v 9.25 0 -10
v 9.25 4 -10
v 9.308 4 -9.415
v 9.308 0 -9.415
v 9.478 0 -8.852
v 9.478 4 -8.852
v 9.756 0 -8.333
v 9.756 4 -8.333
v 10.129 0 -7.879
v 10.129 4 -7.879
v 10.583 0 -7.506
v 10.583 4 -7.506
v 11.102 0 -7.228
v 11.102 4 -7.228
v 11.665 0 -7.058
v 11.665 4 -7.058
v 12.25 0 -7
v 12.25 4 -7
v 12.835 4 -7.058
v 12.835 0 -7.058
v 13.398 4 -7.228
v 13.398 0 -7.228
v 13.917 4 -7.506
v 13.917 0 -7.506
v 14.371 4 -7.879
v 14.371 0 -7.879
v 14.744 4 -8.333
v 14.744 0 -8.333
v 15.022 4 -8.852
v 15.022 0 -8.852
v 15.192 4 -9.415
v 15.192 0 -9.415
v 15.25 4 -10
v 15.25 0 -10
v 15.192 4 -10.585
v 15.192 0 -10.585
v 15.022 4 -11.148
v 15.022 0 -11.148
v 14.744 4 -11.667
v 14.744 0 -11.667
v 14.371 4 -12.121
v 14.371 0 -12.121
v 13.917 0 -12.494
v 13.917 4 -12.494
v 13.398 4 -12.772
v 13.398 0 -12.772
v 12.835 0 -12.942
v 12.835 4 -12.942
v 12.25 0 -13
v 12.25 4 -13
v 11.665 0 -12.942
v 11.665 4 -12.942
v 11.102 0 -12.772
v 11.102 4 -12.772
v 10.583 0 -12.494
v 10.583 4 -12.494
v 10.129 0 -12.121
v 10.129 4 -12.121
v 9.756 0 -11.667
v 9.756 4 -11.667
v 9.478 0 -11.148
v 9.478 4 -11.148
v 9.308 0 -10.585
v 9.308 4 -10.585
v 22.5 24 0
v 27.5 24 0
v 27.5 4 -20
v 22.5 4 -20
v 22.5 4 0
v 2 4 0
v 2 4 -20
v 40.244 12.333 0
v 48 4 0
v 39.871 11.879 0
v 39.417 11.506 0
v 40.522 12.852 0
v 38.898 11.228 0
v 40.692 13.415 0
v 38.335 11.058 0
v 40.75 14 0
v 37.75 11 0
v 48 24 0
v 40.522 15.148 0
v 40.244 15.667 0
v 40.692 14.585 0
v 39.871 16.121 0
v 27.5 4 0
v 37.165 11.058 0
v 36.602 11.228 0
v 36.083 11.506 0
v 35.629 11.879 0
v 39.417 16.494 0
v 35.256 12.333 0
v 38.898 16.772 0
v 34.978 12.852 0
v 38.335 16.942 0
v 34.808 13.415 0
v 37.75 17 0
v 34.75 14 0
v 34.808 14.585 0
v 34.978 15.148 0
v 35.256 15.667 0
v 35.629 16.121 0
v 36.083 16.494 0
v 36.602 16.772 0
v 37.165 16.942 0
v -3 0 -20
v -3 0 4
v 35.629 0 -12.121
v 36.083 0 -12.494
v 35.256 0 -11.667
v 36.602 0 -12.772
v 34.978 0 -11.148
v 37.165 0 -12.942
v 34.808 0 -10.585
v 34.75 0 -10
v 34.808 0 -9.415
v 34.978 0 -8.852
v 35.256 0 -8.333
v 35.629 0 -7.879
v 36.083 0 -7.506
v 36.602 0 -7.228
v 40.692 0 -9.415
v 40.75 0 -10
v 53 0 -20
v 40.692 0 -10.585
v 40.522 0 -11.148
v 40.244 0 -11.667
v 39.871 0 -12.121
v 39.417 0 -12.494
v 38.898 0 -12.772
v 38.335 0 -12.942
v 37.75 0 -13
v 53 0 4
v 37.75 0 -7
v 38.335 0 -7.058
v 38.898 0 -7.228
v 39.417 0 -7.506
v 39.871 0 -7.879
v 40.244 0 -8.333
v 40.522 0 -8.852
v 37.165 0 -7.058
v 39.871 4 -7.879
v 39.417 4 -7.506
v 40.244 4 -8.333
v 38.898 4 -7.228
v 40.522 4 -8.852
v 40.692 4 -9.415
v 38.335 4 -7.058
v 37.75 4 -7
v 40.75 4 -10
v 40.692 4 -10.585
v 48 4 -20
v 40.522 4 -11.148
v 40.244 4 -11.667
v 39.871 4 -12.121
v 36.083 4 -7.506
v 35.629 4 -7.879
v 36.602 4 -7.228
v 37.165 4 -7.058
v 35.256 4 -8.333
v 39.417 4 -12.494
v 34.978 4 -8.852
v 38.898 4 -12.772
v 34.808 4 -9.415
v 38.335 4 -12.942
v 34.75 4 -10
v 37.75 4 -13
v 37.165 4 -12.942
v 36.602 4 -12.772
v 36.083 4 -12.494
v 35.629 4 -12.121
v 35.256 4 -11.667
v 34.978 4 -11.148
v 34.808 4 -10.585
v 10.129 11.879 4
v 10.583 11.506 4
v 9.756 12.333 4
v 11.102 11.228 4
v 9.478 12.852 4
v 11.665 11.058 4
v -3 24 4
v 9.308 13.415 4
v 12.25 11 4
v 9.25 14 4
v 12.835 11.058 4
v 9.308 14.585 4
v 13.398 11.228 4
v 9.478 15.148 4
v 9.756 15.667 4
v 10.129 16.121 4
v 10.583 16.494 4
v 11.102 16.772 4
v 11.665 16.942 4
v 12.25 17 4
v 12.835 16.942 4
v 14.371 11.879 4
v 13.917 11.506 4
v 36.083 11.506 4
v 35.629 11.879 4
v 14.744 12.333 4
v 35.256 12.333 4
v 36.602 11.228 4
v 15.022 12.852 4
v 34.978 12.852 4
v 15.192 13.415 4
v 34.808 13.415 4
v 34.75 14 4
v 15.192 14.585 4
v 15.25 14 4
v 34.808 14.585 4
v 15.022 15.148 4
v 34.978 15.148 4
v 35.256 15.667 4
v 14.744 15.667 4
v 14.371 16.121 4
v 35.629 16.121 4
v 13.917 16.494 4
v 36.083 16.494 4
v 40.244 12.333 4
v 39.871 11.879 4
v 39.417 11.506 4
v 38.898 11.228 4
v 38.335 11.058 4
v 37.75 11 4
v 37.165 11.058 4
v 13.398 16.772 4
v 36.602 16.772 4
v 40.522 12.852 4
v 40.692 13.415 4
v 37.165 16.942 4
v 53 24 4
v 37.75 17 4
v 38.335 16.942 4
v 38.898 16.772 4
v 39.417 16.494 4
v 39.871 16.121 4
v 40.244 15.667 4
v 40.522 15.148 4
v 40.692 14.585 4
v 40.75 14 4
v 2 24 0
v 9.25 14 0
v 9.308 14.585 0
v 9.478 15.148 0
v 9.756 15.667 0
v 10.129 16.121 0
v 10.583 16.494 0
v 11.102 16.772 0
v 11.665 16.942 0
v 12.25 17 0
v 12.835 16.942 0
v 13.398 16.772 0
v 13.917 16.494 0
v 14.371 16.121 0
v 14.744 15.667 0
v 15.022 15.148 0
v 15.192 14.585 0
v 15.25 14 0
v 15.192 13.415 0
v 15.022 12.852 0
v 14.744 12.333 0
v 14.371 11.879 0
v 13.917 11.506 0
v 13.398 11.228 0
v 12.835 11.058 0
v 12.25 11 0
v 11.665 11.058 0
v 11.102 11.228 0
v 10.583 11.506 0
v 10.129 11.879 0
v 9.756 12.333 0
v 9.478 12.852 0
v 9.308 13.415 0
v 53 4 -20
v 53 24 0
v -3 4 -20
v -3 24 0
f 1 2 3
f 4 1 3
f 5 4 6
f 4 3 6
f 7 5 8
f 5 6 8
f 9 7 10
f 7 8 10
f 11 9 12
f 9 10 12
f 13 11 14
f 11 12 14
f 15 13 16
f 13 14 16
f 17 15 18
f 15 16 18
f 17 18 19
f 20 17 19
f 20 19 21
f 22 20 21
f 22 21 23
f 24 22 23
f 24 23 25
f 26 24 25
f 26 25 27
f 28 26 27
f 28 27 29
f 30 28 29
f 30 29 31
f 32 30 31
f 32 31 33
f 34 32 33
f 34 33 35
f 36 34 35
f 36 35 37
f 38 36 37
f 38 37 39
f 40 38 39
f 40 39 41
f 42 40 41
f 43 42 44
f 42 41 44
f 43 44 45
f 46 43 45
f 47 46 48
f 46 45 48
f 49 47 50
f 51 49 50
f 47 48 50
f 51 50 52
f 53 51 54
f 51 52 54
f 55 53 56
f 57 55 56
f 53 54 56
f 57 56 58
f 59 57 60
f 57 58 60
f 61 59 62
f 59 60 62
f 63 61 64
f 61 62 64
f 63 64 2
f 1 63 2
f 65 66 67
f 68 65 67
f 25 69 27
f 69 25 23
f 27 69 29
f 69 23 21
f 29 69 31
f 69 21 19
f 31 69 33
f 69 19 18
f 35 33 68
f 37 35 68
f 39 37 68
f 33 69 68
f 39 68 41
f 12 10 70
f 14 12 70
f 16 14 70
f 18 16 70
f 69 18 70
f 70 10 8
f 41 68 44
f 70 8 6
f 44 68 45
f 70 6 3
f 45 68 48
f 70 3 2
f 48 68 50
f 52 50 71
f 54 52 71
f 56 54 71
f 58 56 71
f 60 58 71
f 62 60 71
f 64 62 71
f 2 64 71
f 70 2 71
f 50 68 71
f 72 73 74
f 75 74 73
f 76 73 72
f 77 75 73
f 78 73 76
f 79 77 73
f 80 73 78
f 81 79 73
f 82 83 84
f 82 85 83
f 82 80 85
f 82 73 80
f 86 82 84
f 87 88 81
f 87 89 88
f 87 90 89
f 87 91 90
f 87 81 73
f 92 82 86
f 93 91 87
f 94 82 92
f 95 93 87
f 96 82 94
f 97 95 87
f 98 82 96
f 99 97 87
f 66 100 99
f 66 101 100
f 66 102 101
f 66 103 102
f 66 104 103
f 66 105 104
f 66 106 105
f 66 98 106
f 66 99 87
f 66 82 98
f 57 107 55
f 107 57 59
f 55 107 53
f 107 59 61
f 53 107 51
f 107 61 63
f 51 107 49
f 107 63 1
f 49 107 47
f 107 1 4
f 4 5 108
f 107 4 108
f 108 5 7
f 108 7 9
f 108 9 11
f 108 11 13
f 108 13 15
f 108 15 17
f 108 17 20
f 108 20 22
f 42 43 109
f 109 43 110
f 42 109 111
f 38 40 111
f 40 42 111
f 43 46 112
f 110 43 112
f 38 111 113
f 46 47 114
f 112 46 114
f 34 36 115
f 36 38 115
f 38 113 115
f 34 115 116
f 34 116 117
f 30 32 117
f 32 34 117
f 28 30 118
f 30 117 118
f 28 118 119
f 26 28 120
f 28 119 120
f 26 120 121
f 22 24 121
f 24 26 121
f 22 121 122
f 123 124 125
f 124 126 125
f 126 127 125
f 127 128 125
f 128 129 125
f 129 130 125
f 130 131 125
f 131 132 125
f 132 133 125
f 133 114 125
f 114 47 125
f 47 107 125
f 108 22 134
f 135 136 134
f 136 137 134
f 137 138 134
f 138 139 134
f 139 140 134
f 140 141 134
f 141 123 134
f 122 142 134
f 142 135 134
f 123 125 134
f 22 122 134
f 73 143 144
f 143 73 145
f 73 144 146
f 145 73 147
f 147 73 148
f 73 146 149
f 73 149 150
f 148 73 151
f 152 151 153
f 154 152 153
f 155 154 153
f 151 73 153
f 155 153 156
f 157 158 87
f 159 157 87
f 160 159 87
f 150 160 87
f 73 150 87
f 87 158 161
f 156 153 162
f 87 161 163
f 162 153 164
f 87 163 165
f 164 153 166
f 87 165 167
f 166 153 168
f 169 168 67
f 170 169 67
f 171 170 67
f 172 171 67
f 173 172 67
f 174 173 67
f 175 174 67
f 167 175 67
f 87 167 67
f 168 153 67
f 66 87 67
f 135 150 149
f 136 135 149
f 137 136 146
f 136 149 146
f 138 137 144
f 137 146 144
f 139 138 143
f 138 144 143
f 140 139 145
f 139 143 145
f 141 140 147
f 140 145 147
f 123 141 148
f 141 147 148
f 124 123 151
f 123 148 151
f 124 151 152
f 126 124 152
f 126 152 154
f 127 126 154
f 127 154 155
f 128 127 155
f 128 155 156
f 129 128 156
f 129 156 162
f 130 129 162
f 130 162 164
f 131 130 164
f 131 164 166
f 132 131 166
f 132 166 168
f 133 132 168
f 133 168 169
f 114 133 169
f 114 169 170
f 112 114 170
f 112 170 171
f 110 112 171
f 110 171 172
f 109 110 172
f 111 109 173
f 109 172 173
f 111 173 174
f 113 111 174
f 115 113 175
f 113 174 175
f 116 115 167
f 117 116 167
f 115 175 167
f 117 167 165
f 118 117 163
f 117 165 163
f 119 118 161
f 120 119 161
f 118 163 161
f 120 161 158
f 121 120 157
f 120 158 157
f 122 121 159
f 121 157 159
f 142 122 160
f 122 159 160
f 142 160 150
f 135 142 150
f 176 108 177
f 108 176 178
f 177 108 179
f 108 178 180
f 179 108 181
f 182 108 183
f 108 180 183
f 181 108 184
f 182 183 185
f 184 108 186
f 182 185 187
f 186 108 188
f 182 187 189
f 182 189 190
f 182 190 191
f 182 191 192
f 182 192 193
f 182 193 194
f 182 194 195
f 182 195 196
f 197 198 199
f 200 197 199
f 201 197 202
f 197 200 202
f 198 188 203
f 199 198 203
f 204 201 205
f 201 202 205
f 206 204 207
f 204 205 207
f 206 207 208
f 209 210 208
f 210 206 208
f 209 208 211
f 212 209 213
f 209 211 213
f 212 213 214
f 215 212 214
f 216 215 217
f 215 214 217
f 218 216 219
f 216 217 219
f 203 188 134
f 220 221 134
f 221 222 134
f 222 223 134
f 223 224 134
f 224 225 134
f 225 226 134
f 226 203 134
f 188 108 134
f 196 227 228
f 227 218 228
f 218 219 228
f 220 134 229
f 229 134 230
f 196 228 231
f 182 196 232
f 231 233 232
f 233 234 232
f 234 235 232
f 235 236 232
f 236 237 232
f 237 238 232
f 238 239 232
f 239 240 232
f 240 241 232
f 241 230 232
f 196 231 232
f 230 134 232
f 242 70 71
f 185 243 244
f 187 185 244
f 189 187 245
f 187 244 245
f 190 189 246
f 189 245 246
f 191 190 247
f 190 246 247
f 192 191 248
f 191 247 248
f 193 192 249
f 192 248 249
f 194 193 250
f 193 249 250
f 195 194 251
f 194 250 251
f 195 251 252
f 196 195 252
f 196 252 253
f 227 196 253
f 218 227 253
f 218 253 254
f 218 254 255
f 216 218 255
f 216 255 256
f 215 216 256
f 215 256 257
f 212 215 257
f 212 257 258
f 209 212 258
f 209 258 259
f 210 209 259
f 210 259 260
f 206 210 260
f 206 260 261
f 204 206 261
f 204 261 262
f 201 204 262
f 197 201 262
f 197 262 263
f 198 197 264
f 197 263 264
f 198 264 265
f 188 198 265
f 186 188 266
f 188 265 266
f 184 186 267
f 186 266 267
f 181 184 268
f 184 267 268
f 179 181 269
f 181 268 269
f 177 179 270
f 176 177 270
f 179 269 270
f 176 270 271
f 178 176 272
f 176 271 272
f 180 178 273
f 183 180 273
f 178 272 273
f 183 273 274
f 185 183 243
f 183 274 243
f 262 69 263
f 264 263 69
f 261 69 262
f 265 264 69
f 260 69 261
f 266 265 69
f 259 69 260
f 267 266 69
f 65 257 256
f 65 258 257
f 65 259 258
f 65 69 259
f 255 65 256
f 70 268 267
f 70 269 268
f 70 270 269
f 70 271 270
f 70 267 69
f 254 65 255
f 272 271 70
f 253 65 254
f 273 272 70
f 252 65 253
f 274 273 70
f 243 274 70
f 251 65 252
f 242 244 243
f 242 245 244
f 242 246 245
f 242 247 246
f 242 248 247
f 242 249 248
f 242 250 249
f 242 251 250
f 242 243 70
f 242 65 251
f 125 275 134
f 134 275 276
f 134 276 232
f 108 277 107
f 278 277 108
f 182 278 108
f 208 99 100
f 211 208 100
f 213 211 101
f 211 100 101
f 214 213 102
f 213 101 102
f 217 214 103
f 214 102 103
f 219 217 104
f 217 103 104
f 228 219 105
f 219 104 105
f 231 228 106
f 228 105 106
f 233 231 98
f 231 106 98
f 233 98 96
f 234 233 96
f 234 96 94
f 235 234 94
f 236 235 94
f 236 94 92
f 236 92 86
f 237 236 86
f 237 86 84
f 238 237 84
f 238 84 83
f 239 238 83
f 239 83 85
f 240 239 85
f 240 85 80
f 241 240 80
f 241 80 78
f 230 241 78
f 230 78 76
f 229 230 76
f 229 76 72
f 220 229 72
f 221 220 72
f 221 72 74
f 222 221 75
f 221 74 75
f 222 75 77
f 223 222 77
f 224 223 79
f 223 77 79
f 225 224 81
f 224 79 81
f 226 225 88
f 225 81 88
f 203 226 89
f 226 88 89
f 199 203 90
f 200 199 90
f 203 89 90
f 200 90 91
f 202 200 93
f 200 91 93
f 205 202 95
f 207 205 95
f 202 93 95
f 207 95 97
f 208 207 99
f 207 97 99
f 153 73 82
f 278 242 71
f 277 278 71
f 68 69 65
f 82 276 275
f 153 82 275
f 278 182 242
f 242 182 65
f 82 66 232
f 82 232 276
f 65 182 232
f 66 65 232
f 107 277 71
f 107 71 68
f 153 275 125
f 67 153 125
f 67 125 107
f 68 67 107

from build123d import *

# Parameters (mm, degrees)
CROQUIS1_R                   = 2.5
SALIENTE_EXTRUIR1_DEPTH      = 4
CROQUIS2_W                   = 50
CROQUIS2_H                   = 4
SALIENTE_EXTRUIR2_DEPTH      = 20
SALIENTE_EXTRUIR3_DEPTH      = 3
SALIENTE_EXTRUIR3_DEPTH_BACK = 53
CROQUIS4_W                   = 20.5
CROQUIS4_H                   = 20
CORTAR_EXTRUIR1_DEPTH        = 20
CROQUIS5_R                   = 3
CORTAR_EXTRUIR2_DEPTH        = 17
CROQUIS6_R                   = 3
CORTAR_EXTRUIR3_DEPTH        = 20


with BuildPart() as part:
    # Croquis1 → Saliente-Extruir1 (new body)
    with BuildSketch(Plane(origin=(0, 0, 0), x_dir=(1, 0, 0), z_dir=(0, 1, 0))):
        Polygon((0, 0), (0, 20), (50, 20), (50, 0), (50, -4), (0, -4), align=None)
        with Locations(Location((12.5, 10, 0), (0, 0, 270))):
            Circle(CROQUIS1_R, mode=Mode.SUBTRACT)
        with Locations(Location((37.5, 10, 0), (0, 0, 270))):
            Circle(CROQUIS1_R, mode=Mode.SUBTRACT)
    extrude(amount=SALIENTE_EXTRUIR1_DEPTH)

    # Croquis2 → Saliente-Extruir2 (add)
    with BuildSketch(Plane(origin=(0, 4, 0), x_dir=(1, 0, 0), z_dir=(0, 1, 0))):
        with Locations((25, -2)):
            Rectangle(CROQUIS2_W, CROQUIS2_H)
    extrude(amount=SALIENTE_EXTRUIR2_DEPTH)

    # Croquis3 → Saliente-Extruir3 (add, two sides: drawn at the far end of the back side and taken through both)
    with BuildSketch(Plane.ZY.offset(-SALIENTE_EXTRUIR3_DEPTH_BACK)):
        Polygon((-20, 4), (-20, 0), (4, 0), (4, 24), (0, 24), align=None)
    extrude(amount=SALIENTE_EXTRUIR3_DEPTH + SALIENTE_EXTRUIR3_DEPTH_BACK)

    # Croquis4 → Cortar-Extruir1 (cut)
    with BuildSketch(Plane(origin=(0, 0, -20), x_dir=(-1, 0, 0), z_dir=(0, 0, -1))):
        with Locations((-37.75, 14)):
            Rectangle(CROQUIS4_W, CROQUIS4_H)
        with Locations((-12.25, 14)):
            Rectangle(CROQUIS4_W, CROQUIS4_H)
    extrude(amount=-CORTAR_EXTRUIR1_DEPTH, mode=Mode.SUBTRACT)

    # Croquis5 → Cortar-Extruir2 (cut)
    with BuildSketch(Plane(origin=(0, 0, 0), x_dir=(-1, 0, 0), z_dir=(0, 0, -1))):
        with Locations((-37.75, 14)):
            Circle(CROQUIS5_R)
        with Locations((-12.25, 14)):
            Circle(CROQUIS5_R)
    extrude(amount=-CORTAR_EXTRUIR2_DEPTH, mode=Mode.SUBTRACT)

    # Croquis6 → Cortar-Extruir3 (cut)
    with BuildSketch(Plane(origin=(0, 4, 0), x_dir=(1, 0, 0), z_dir=(0, 1, 0))):
        with Locations(Location((12.25, 10, 0), (0, 0, 180))):
            Circle(CROQUIS6_R)
        with Locations(Location((37.75, 10, 0), (0, 0, 270))):
            Circle(CROQUIS6_R)
    extrude(amount=-CORTAR_EXTRUIR3_DEPTH, mode=Mode.SUBTRACT)


solid = part.part
